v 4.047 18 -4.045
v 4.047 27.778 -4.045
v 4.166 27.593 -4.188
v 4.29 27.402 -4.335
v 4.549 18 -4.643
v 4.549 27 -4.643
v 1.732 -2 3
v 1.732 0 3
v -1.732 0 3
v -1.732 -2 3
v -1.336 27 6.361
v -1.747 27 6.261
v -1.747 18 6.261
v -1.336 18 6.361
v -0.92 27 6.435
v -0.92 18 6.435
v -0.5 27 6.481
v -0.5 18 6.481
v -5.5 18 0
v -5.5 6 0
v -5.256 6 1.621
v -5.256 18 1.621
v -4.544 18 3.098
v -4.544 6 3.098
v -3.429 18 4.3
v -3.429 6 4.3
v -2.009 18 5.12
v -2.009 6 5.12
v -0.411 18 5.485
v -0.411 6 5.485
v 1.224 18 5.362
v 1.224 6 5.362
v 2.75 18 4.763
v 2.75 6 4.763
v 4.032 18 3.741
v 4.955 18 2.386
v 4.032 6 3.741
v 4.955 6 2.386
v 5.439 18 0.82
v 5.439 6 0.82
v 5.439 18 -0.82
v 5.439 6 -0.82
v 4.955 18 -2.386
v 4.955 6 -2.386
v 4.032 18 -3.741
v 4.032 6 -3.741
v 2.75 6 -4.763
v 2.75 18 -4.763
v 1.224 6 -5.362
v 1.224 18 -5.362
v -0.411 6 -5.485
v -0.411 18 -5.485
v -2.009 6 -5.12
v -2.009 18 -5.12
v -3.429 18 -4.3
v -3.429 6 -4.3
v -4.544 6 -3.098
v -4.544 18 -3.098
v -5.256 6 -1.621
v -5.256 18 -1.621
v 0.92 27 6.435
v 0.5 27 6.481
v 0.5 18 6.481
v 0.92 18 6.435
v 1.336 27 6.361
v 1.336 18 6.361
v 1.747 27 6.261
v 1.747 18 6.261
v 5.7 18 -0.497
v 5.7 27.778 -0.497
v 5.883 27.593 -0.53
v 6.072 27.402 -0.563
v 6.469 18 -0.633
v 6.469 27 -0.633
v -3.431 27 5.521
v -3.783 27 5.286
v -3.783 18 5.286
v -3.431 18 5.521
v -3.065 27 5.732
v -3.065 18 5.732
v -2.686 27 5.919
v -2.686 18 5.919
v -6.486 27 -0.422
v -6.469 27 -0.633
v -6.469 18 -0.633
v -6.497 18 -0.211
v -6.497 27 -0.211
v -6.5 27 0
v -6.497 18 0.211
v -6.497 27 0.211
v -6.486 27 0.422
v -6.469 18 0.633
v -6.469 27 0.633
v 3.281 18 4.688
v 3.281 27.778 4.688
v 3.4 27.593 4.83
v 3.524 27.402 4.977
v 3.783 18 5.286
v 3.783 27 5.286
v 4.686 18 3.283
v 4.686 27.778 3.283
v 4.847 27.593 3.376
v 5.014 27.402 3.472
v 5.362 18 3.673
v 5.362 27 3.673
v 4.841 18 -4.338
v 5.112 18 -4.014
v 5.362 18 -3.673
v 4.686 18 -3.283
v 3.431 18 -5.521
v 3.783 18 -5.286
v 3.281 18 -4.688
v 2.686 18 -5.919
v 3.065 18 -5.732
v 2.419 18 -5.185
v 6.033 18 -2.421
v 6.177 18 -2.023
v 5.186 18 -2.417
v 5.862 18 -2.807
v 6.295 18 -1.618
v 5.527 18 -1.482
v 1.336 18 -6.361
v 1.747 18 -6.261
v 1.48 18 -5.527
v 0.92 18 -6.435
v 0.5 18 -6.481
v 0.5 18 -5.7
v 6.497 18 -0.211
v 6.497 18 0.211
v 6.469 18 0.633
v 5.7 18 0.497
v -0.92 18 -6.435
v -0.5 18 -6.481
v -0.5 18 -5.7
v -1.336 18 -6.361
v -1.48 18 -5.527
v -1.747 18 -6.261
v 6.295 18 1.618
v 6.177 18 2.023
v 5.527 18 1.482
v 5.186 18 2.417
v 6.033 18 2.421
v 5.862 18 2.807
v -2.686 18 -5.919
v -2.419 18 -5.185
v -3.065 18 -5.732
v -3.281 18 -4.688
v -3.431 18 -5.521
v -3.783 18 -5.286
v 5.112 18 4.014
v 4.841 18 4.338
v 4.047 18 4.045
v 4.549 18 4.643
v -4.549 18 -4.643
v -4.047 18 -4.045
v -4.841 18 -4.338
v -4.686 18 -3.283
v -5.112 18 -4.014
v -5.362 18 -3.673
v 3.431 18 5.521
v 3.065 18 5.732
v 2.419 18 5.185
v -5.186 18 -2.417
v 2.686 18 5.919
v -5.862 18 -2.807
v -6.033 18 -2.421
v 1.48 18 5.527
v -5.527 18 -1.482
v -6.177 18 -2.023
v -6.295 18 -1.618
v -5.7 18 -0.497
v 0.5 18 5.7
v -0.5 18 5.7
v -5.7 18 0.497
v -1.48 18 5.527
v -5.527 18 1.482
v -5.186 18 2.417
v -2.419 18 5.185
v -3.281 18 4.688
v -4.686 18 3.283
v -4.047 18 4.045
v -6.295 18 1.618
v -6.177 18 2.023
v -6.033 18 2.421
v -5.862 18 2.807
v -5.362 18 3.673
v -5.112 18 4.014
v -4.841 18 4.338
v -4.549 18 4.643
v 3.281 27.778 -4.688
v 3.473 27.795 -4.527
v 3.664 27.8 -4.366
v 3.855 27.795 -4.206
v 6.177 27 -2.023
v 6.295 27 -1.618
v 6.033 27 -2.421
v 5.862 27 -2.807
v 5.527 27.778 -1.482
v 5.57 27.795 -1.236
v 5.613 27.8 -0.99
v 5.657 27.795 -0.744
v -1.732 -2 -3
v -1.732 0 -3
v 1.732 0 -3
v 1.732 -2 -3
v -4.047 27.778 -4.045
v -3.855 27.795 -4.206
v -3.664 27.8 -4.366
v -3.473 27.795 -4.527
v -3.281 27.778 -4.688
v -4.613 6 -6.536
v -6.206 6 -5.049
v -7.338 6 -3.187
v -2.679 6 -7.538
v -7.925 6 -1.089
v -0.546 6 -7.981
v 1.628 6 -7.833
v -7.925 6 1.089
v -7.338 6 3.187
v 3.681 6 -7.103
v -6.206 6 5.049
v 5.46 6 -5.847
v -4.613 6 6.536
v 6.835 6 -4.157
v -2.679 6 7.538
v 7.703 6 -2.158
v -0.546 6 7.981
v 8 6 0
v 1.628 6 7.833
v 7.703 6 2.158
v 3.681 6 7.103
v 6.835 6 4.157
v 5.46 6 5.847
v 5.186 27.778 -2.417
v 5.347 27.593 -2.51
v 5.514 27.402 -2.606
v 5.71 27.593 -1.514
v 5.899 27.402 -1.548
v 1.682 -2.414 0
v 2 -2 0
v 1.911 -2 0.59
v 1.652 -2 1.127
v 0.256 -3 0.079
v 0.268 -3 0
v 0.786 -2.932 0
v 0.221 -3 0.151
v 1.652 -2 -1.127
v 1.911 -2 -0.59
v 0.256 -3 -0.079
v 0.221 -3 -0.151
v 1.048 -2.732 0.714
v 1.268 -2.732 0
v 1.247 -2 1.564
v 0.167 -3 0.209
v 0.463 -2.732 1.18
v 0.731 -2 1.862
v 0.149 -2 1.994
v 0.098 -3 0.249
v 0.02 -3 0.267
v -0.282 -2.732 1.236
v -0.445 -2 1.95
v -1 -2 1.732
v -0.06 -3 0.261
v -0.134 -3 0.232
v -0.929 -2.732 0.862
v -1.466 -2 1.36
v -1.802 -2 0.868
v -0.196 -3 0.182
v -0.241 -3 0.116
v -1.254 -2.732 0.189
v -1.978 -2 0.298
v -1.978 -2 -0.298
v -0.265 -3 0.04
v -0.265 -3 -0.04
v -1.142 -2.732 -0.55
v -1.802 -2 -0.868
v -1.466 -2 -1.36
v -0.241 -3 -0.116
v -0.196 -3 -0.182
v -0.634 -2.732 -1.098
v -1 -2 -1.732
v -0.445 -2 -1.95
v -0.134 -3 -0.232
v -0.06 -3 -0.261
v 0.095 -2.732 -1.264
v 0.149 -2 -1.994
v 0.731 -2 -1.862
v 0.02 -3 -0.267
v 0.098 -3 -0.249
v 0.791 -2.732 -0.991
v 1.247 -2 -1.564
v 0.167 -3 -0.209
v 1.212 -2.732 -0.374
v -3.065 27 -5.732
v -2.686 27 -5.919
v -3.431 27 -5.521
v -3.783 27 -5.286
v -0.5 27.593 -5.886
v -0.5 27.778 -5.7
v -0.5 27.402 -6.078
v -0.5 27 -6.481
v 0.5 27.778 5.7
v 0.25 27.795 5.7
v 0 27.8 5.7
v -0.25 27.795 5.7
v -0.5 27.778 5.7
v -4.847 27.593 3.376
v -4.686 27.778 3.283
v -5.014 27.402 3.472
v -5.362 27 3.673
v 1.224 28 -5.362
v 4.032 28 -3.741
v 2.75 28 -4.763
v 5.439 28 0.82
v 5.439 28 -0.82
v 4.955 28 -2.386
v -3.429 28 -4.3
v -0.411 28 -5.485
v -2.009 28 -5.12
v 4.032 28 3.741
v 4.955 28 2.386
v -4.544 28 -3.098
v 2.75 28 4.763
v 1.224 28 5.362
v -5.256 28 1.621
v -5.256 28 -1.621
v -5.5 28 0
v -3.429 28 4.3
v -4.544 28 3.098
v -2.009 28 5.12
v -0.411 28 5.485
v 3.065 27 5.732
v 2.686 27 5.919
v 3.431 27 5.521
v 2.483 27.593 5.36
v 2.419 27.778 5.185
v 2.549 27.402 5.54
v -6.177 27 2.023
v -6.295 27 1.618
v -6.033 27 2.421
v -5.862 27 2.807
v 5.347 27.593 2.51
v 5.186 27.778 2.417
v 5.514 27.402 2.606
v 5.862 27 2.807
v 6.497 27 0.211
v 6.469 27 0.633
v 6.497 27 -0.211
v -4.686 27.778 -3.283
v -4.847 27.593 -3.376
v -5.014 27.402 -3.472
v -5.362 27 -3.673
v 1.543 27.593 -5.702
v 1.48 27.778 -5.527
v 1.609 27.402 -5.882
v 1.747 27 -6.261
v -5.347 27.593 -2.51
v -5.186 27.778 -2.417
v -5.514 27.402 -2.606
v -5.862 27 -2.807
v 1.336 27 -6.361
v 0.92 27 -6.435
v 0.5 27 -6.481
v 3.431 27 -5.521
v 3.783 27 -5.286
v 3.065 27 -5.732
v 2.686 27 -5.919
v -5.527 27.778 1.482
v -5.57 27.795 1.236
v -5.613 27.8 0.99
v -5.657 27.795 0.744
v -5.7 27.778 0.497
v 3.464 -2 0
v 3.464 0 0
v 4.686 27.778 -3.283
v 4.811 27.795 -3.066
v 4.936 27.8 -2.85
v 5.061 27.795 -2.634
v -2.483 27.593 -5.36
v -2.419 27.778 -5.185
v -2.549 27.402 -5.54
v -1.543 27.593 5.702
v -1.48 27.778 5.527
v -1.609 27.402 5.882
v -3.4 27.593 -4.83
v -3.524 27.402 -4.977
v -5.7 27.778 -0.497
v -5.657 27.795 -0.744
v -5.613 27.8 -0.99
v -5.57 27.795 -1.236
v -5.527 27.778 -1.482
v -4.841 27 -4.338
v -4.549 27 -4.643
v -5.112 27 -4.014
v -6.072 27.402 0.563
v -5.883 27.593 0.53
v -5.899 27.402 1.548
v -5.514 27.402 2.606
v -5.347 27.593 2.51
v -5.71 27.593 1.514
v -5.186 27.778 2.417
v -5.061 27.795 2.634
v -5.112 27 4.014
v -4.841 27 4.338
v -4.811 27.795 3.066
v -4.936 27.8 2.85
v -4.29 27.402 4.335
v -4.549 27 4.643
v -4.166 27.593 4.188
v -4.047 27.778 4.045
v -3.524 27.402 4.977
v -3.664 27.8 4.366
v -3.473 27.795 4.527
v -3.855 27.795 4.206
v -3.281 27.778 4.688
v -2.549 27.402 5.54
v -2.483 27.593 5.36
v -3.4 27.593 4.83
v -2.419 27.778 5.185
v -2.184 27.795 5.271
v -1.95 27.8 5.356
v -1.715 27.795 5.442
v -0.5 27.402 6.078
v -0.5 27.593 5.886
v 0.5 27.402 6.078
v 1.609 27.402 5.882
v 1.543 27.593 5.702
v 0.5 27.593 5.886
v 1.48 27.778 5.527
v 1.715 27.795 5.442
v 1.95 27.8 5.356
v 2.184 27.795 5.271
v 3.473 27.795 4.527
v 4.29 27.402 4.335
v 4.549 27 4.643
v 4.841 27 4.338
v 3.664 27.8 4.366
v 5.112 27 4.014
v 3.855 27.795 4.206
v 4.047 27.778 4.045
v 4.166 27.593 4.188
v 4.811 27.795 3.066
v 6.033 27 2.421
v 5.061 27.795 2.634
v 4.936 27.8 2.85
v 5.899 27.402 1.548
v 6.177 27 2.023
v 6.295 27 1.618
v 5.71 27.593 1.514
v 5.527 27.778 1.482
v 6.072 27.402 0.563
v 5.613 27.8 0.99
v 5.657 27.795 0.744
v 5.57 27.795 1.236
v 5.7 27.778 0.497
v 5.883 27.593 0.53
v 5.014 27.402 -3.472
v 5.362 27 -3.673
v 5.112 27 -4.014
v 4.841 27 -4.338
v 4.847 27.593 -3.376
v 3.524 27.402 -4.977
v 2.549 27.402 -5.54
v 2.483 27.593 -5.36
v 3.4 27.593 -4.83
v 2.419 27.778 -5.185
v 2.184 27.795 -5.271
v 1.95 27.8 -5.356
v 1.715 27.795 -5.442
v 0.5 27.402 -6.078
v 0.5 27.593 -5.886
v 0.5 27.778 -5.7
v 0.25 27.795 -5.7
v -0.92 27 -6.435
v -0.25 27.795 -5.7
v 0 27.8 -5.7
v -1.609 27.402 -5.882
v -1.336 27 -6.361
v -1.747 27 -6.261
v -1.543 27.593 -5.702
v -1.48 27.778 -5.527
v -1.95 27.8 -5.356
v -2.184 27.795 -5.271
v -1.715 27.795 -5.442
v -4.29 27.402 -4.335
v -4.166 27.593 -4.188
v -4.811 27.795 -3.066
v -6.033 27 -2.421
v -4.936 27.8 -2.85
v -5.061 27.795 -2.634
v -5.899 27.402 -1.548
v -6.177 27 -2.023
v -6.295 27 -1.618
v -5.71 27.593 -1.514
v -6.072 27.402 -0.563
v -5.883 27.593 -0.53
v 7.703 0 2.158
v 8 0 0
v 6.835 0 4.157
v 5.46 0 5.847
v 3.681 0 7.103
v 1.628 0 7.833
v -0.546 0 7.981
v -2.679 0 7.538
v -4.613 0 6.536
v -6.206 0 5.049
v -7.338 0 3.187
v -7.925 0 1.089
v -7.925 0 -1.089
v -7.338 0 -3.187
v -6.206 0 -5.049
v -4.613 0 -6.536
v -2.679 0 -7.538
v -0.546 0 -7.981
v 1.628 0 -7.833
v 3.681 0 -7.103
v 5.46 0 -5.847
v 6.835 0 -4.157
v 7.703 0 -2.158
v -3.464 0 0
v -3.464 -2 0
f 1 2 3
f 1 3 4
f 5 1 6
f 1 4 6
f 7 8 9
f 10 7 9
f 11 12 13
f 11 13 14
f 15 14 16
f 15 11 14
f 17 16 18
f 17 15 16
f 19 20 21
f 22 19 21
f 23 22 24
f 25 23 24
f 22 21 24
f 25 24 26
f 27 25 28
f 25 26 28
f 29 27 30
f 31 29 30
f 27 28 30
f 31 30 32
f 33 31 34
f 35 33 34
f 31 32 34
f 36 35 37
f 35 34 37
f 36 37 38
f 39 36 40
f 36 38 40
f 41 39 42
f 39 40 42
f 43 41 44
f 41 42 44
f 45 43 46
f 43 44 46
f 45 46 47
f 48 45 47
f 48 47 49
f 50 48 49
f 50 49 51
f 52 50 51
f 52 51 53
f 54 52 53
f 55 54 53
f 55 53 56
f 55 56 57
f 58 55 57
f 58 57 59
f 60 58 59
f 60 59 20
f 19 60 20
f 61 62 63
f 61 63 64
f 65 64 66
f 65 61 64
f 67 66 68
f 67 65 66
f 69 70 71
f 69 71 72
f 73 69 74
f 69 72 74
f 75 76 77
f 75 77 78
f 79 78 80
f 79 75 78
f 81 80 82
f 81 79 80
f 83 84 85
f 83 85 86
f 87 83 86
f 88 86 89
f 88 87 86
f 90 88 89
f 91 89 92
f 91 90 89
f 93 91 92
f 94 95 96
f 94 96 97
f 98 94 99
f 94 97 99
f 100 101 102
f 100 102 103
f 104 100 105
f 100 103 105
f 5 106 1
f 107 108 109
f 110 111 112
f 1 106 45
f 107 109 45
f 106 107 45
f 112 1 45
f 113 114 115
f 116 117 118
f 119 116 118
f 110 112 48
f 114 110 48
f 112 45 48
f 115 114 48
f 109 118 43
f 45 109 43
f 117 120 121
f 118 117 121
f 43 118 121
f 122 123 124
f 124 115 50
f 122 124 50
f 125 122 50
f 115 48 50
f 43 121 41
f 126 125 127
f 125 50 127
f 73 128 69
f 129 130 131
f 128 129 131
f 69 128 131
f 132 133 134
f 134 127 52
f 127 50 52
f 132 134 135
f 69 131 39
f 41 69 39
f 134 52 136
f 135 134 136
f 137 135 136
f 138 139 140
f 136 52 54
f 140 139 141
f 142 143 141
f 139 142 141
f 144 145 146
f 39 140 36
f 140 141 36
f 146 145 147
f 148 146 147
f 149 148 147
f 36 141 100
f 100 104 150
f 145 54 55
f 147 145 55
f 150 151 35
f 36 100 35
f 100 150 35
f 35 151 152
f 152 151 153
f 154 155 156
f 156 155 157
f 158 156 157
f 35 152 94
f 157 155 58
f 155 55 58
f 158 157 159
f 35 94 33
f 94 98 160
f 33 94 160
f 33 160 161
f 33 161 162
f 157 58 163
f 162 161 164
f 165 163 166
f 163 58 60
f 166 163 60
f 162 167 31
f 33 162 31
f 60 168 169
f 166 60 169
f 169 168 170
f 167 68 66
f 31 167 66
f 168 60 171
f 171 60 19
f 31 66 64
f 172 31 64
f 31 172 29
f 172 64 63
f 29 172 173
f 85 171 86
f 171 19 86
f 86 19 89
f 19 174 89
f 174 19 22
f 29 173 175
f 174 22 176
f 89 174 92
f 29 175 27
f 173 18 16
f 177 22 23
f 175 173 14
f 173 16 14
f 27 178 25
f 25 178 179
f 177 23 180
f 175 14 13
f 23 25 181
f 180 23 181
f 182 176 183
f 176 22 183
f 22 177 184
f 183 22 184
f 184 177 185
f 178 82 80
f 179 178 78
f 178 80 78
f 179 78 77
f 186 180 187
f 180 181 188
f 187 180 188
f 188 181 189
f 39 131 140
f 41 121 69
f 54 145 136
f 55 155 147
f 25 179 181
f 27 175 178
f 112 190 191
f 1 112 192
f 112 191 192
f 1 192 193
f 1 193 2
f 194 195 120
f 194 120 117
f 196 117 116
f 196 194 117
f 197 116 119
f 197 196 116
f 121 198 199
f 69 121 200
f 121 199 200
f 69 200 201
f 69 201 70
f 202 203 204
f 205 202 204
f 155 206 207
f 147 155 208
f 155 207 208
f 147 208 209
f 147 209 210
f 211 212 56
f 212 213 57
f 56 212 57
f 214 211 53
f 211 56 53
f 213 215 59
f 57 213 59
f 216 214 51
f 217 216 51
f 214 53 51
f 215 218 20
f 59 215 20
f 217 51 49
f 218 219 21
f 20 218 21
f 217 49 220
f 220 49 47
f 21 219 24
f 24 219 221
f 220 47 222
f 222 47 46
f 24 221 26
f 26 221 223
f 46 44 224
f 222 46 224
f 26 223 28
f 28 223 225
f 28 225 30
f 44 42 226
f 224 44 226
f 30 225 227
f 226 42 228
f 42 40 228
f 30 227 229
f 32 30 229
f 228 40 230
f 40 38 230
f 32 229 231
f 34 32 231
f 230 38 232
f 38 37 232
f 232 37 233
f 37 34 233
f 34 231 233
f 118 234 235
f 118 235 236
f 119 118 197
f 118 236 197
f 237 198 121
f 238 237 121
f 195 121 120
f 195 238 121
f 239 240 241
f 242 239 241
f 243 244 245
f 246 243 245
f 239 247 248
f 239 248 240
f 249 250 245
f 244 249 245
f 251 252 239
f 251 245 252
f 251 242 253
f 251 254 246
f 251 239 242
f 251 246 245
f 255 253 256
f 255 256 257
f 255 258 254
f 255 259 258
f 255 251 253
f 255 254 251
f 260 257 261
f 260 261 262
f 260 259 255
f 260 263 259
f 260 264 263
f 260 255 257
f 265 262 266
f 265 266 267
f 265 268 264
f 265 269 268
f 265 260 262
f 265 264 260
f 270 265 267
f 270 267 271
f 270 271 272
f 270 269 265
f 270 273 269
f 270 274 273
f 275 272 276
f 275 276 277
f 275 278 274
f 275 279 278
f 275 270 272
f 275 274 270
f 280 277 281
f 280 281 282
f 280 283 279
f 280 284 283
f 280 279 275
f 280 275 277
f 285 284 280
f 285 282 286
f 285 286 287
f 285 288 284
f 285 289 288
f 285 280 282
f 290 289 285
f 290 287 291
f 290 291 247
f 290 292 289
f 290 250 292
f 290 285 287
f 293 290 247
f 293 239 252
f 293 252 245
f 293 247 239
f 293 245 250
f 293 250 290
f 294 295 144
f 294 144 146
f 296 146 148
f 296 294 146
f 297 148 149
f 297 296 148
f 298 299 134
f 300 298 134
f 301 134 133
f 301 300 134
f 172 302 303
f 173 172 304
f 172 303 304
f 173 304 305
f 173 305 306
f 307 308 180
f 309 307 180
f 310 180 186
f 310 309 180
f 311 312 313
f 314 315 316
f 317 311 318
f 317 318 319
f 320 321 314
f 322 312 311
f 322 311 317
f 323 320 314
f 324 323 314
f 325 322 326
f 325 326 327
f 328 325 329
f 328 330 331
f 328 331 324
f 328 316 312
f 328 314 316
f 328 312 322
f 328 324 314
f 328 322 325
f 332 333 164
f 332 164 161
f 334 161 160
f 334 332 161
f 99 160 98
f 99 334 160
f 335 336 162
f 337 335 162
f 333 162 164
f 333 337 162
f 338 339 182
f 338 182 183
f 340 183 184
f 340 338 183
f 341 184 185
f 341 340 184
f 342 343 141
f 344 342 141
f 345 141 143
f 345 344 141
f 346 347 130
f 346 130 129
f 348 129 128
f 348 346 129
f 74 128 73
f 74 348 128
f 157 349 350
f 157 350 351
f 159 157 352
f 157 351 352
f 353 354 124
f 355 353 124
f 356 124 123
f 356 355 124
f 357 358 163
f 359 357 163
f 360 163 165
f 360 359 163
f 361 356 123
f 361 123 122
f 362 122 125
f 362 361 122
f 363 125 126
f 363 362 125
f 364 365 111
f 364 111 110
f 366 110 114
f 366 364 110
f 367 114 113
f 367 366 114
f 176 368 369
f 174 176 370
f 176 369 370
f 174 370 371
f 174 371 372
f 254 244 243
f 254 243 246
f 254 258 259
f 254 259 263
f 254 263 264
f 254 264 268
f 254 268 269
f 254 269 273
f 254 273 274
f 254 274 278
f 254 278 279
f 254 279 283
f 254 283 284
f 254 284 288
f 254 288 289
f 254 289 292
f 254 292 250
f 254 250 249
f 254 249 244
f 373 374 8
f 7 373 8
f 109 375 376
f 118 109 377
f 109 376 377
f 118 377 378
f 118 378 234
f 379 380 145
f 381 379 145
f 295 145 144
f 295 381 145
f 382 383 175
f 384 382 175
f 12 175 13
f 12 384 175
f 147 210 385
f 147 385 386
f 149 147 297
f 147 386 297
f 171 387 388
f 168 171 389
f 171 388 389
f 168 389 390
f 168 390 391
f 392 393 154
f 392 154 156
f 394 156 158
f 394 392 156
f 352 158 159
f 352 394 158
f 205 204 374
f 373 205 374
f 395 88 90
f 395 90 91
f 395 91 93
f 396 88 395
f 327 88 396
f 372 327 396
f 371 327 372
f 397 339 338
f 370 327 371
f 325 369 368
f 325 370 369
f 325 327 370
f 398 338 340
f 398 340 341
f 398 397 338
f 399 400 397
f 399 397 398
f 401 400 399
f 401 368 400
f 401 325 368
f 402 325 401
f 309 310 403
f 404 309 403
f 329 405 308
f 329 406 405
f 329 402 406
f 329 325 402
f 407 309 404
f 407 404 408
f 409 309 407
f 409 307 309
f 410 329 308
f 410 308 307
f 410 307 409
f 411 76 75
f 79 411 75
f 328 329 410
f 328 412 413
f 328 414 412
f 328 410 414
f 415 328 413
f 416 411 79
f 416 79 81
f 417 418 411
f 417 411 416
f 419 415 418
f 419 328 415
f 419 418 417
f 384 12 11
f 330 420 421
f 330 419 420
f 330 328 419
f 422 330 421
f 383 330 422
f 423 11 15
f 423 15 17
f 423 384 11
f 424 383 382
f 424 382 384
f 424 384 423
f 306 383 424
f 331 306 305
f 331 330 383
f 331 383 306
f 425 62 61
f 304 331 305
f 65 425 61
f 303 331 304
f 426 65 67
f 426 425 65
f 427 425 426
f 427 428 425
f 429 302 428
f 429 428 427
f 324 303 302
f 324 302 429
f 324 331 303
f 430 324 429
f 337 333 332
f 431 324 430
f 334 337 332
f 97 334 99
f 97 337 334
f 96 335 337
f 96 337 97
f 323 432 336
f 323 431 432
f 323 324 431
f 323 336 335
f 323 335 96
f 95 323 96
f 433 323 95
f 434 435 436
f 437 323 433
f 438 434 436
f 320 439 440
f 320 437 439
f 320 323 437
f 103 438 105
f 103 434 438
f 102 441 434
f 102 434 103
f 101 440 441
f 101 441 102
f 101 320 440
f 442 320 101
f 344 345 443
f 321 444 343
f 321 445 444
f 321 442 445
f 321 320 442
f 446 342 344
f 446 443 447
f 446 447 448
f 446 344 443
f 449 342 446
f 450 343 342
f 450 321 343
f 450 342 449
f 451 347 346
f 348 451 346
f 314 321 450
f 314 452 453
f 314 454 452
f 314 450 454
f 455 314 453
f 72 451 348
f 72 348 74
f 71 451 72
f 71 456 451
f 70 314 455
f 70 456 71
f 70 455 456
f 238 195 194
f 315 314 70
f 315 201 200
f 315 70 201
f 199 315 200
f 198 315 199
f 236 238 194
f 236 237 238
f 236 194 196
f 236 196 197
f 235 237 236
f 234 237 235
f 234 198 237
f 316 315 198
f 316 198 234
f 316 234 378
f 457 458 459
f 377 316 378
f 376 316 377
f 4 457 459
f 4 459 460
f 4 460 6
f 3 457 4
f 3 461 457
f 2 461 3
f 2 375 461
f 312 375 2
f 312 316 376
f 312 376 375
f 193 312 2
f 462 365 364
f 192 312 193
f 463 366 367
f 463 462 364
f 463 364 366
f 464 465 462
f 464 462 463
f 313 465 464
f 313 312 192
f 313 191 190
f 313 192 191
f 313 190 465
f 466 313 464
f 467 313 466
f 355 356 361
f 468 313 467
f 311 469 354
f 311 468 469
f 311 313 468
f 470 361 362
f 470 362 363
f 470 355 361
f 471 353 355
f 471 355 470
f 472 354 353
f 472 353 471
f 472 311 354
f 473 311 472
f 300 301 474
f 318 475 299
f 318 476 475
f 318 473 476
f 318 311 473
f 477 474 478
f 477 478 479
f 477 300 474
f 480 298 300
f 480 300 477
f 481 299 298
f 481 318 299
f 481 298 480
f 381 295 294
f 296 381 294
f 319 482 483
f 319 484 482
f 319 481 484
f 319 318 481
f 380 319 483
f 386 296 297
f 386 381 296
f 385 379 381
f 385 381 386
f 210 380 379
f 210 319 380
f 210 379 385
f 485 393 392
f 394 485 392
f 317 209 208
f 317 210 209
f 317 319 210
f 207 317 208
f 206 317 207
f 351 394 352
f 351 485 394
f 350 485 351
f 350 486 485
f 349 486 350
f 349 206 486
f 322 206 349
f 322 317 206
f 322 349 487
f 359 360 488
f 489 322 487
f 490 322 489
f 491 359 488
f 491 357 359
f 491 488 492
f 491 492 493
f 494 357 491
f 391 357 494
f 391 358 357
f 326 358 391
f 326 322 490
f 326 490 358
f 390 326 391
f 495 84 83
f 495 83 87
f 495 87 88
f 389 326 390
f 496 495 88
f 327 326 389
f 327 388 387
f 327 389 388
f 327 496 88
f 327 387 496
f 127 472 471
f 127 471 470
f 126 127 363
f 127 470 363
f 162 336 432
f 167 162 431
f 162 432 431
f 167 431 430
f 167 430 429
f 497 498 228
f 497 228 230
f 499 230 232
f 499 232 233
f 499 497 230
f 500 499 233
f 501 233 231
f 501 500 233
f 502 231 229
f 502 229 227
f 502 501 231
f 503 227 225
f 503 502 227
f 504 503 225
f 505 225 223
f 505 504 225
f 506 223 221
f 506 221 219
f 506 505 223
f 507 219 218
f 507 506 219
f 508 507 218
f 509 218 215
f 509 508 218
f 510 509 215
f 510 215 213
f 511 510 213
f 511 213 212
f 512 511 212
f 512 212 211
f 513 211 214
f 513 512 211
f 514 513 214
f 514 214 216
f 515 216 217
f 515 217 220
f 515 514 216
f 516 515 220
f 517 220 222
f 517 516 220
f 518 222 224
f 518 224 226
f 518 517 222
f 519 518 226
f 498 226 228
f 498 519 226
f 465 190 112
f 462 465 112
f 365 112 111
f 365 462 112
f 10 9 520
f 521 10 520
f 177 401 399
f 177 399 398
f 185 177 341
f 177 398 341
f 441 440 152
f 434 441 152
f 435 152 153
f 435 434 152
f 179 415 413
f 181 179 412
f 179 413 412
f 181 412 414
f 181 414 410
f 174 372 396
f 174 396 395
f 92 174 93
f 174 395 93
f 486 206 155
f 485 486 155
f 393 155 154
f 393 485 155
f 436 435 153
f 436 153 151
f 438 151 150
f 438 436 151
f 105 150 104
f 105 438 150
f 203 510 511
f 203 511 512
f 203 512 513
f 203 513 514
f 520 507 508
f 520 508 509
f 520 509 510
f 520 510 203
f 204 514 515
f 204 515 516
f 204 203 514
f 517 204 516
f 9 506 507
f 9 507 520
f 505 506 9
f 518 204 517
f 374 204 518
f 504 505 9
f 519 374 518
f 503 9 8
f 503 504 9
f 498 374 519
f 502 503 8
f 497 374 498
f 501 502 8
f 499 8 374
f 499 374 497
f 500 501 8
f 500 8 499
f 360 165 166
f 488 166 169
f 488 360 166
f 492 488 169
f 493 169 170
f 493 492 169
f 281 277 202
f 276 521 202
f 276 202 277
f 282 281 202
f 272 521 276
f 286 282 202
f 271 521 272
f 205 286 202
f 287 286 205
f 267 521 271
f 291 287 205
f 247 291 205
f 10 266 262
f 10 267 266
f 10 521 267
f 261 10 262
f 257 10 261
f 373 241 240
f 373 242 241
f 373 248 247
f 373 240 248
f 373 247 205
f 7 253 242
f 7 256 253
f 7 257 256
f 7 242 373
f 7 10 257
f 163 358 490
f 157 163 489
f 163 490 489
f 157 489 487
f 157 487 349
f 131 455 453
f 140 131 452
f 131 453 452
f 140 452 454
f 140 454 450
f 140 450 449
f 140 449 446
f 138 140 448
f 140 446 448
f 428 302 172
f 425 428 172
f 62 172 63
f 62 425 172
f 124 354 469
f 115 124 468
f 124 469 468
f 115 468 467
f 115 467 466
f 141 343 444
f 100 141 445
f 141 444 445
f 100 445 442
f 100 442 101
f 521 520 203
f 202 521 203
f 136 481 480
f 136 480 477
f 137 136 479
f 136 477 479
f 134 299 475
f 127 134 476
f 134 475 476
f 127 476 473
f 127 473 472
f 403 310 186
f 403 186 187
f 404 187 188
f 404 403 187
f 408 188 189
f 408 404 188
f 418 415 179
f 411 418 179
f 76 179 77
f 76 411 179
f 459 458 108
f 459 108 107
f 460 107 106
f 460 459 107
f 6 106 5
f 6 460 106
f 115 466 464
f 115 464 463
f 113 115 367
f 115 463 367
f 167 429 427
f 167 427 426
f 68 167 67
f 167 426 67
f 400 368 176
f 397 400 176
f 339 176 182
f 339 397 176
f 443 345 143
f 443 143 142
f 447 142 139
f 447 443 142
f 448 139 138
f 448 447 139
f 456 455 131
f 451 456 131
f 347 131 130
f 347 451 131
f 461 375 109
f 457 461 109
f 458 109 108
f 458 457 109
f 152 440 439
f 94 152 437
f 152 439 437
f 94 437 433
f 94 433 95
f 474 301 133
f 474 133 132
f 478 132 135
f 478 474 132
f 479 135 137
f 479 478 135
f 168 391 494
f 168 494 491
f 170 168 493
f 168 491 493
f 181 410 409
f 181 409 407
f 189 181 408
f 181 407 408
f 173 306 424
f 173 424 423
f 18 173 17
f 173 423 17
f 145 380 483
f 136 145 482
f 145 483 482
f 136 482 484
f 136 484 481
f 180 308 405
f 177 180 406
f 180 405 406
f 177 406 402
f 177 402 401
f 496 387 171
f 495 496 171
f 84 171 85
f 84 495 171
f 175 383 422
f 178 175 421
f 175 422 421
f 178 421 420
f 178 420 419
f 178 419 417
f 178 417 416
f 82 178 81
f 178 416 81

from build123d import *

# Parameters (mm, degrees)
F0_R             = 8
F1_DEPTH         = 6
F3_DEPTH         = 2
F4_R             = 2
F5_DEPTH         = 1
F7_R             = 5.5
F8_DEPTH         = 22
F9_R             = 6.5
F9_R_2           = 5.5
F10_DEPTH        = 10
F11_SIZE         = 1
F12_W            = 1
F12_H            = 2
F13_DEPTH        = 20
F13_COPIES_COUNT = 18


# Not quite as in the source:
# - a fillet or chamfer that OpenCascade refuses, or shapes differently, is made with other operations: its cross-section is extruded or revolved along the edge and cut away or added
# - a pattern or mirror of a feature is missing from the dataset's text; its kind, count and spacing are read off the source's solid


with BuildPart() as f1:
    # F0 (on Front) → F1 (new body)
    with BuildSketch(Plane.XZ):
        Circle(F0_R)
    extrude(amount=-F1_DEPTH)

    # F2 (on face) → F3 (join)
    with BuildSketch(Plane.XZ):
        Polygon((-1.7320508076, 3), (-3.4641016151, 0), (-1.7320508076, -3), (1.7320508076, -3), (3.4641016151, 0), (1.7320508076, 3), align=None)
    extrude(amount=F3_DEPTH)

    # F4 (on face) → F5 (join)
    with BuildSketch(Plane.XZ.offset(2)):
        Circle(F4_R)
    extrude(amount=F5_DEPTH)

    # F6: fillet of radius 2 on 1 edges, made by hand

    # F6_s1 → F6_t2 (revolve, cut)
    with BuildSketch(Plane.XY):
        with BuildLine():
            ThreePointArc((2, -2), (1.2679491924, -2.7320508076), (0.2679491924, -3))
            Line((0.2679491924, -3), (2, -3))
            Line((2, -3), (2, -2))
        make_face()
    revolve(axis=Axis((0, -3, 0), (0, -1, 0)), mode=Mode.SUBTRACT)

    # F7 (on face) → F8 (join)
    with BuildSketch(Plane(origin=(0, 6, 0), x_dir=(-1, 0, 0), z_dir=(0, 1, 0))):
        Circle(F7_R)
    extrude(amount=F8_DEPTH)

    # F9 (on face) → F10 (join)
    with BuildSketch(Plane(origin=(0, 28, 0), x_dir=(-1, 0, 0), z_dir=(0, 1, 0))):
        Circle(F9_R)
        Circle(F9_R_2, mode=Mode.SUBTRACT)
    extrude(amount=-F10_DEPTH)

    # F11
    f11_edges = [f1.edges().sort_by_distance(p)[0] for p in [
        (6.5, 28, 0),
    ]]
    chamfer(f11_edges, length=F11_SIZE)

    # F12 (on face) → F13 (cut)
    with BuildSketch(Plane(origin=(0, 28, 0), x_dir=(-1, 0, 0), z_dir=(0, 1, 0))):
        with Locations((0, 6.7)):
            Rectangle(F12_W, F12_H)
    f13 = extrude(amount=-F13_DEPTH, mode=Mode.SUBTRACT)

    # F13_copies: F13 ×18 about axis
    f13_copies_axis = Axis((0, 0, 0), (0, 1, 0))
    for i in range(1, F13_COPIES_COUNT):
        add(f13.rotate(f13_copies_axis, i * 360 / F13_COPIES_COUNT), mode=Mode.SUBTRACT)


solid = f1.part
